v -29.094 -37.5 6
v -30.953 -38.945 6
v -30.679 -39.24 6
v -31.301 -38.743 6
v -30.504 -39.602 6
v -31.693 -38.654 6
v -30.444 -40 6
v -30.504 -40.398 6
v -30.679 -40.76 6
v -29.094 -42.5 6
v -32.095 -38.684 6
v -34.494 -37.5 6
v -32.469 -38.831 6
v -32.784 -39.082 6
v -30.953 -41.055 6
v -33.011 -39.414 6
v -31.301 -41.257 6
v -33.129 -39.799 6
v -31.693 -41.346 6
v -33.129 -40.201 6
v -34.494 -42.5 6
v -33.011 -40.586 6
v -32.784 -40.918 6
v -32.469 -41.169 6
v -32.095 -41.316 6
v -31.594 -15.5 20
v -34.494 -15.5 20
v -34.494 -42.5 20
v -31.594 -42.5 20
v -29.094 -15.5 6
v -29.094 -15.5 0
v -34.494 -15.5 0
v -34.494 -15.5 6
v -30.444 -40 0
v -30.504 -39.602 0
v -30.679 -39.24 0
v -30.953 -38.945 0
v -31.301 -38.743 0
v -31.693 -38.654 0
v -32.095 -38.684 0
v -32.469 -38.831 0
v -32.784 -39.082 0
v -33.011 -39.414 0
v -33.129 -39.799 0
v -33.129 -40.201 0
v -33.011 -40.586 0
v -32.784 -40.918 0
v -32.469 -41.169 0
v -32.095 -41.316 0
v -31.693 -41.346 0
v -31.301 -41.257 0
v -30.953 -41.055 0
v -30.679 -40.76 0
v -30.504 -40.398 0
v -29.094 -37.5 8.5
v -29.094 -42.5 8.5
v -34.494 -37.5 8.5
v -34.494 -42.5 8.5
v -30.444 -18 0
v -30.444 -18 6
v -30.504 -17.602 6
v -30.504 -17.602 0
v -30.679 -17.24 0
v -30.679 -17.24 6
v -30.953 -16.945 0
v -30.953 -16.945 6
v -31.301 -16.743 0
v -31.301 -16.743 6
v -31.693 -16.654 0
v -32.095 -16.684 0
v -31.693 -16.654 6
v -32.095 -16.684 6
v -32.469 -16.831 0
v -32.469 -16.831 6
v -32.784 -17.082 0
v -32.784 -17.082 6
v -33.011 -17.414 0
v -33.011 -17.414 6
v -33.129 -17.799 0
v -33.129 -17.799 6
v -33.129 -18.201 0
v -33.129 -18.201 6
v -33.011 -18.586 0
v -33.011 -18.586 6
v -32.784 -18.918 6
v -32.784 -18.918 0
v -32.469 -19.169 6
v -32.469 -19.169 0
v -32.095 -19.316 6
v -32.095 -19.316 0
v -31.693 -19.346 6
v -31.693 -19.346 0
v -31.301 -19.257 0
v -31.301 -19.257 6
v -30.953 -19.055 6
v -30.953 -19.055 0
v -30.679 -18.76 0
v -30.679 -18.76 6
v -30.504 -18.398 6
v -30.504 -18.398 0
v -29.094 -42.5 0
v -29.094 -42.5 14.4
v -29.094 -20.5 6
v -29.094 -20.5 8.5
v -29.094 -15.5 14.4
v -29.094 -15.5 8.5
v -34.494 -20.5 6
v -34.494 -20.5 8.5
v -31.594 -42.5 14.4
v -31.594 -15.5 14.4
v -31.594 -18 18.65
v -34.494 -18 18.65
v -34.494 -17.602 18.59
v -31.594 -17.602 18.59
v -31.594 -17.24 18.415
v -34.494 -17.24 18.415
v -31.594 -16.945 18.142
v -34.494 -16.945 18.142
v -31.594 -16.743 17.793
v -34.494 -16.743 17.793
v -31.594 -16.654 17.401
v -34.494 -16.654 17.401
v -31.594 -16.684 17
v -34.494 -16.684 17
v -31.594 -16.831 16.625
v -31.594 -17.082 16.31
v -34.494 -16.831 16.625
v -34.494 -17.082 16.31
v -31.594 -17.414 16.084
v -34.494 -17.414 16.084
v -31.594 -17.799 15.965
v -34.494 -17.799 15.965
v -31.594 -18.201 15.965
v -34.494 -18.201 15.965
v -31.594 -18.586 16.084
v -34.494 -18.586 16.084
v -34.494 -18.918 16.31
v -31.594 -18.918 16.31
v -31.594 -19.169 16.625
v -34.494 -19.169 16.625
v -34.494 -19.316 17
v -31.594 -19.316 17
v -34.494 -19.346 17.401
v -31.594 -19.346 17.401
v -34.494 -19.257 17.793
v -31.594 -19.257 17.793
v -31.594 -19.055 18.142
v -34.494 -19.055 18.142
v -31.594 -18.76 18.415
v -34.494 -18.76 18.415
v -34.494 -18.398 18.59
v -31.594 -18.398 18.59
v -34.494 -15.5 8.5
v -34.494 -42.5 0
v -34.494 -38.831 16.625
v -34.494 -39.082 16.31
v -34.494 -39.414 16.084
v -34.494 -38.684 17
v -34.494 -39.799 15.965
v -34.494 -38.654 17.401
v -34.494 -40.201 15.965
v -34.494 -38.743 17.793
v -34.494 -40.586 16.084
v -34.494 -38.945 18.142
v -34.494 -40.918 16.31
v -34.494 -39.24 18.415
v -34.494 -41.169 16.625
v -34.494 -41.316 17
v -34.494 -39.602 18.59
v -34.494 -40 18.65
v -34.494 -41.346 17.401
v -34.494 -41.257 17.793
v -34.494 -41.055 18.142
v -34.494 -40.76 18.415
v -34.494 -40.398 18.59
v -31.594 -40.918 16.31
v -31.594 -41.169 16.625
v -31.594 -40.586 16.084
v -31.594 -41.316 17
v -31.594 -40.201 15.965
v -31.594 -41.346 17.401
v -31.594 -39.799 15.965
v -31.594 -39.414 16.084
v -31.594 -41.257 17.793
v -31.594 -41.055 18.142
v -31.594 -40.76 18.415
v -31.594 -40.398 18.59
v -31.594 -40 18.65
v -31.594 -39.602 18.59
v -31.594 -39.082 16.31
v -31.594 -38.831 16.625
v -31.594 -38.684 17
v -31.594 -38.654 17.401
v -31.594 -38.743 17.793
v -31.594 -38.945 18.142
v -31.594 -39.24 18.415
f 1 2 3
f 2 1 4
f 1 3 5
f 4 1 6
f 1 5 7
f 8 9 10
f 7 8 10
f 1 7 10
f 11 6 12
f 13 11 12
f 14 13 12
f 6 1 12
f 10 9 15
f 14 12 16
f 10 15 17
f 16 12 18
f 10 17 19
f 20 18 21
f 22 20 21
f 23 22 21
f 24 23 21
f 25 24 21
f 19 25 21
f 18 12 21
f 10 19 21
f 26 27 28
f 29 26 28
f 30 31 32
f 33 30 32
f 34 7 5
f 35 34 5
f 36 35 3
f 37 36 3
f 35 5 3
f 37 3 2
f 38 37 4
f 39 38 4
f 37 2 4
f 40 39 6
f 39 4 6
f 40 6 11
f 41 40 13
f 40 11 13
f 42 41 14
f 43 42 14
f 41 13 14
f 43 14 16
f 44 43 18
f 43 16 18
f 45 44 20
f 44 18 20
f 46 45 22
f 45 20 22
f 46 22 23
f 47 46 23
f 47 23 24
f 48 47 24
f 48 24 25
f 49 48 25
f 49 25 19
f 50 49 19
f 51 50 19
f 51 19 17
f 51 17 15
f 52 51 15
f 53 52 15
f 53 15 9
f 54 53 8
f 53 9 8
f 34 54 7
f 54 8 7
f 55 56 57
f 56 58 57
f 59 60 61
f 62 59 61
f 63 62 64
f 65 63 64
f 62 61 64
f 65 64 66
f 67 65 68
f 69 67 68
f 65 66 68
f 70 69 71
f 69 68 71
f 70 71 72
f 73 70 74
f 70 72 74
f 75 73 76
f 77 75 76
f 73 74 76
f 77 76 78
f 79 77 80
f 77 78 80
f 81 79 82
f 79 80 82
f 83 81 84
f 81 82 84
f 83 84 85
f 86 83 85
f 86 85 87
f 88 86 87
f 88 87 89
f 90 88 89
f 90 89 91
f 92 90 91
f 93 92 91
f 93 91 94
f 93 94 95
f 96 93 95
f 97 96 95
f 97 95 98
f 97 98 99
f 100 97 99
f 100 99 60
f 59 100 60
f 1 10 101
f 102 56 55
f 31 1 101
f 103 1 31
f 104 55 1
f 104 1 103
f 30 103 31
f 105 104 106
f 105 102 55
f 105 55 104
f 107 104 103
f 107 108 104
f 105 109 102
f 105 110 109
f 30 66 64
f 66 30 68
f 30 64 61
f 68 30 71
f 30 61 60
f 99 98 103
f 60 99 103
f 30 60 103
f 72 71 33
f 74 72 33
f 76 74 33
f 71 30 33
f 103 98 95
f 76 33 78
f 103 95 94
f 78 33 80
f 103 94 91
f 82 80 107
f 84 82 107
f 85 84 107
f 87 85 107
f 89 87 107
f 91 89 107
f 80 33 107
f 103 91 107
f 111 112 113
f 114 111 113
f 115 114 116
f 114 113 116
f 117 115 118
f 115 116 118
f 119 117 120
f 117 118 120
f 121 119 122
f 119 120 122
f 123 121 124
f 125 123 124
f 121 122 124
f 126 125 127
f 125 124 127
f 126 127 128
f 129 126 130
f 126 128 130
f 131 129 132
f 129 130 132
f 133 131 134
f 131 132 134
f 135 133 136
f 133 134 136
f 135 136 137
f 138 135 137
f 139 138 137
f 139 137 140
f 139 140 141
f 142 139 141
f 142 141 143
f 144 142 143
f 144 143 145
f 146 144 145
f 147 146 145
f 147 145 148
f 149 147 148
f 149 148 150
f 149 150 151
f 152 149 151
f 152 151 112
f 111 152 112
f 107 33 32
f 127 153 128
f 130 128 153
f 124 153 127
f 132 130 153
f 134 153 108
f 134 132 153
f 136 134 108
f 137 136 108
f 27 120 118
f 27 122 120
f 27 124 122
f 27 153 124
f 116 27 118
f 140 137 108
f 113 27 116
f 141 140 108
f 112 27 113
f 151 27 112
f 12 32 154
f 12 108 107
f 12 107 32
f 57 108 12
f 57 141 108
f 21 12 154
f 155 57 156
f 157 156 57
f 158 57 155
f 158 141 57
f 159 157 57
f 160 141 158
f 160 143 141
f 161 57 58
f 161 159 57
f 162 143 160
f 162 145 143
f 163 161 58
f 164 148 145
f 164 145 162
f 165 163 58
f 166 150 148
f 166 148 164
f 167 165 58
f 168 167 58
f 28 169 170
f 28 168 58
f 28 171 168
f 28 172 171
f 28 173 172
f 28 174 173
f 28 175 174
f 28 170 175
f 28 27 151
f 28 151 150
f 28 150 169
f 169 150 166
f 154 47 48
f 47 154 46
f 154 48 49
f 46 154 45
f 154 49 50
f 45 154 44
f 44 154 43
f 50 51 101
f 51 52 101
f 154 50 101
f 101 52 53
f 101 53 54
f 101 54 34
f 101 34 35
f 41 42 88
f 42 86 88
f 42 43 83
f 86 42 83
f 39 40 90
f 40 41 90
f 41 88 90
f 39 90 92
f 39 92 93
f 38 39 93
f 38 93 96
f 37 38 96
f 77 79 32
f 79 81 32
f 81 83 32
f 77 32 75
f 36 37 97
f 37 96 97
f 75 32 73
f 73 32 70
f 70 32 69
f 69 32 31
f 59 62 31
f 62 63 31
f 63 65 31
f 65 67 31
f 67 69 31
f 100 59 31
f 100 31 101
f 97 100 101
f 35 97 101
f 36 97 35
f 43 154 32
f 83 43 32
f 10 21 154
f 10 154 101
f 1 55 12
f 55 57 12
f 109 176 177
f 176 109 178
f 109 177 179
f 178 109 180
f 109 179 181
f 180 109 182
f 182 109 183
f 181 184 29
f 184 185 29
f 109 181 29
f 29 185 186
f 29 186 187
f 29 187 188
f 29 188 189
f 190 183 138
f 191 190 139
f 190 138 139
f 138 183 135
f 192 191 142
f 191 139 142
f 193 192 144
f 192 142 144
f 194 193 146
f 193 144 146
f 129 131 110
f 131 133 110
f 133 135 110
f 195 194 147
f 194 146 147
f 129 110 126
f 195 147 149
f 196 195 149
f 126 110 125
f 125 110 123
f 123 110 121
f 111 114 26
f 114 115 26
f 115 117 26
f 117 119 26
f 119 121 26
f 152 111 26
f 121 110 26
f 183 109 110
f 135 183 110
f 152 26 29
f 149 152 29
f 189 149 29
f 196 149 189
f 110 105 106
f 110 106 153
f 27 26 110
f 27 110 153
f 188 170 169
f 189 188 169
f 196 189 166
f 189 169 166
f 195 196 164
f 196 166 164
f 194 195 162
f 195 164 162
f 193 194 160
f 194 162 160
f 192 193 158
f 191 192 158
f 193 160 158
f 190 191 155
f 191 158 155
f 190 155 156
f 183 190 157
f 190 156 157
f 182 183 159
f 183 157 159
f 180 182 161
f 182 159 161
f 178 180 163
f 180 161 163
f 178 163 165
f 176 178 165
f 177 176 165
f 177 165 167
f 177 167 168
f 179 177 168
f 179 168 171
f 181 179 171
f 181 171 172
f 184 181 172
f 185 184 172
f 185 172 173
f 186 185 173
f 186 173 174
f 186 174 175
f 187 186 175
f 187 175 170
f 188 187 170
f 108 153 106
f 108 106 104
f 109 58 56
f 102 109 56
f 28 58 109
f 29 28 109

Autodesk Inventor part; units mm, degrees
ref_plane "YZ Plane" through (0, 0, 0) normal (1, 0, 0) x (0, 1, 0)
ref_plane "XZ Plane" through (0, 0, 0) normal (0, 1, 0) x (-1, 0, 0)
ref_plane "작업 평면1" through (-17.0116, -44.6019, 14.5) normal (0, 0, -1) x (0, 1, 0)
sketch "스케치4" plane through (0, 0, 0) normal (0, 0, 1) x (1, 0, 0)
  arc A0 (-34.0751, 6.2636) -> (-34.5943, 4.5766) centre (-31.5943, 4.5766) ccw projected
  line L0 (-34.5943, -39.6766) -> (-34.5943, 4.5766) projected
  arc A1 (-34.5943, -39.6766) -> (-34.0751, -41.3636) centre (-31.5943, -39.6766) ccw projected
  line L1 (-30.3872, -46.7869) -> (-34.0751, -41.3636) projected
  arc A2 (-30.3872, -46.7869) -> (-27.9064, -48.1) centre (-27.9064, -45.1) ccw projected
  line L2 (-1.0822, -48.1) -> (-27.9064, -48.1) projected
  arc A3 (-1.0822, -48.1) -> (1.3986, -46.7869) centre (-1.0822, -45.1) ccw projected
  line L3 (5.0865, -41.3636) -> (1.3986, -46.7869) projected
  arc A4 (5.0865, -41.3636) -> (5.6057, -39.6766) centre (2.6057, -39.6766) ccw projected
  line L4 (5.6057, 4.5766) -> (5.6057, -39.6766) projected
  arc A5 (5.6057, 4.5766) -> (5.0865, 6.2636) centre (2.6057, 4.5766) ccw projected
  line L5 (1.1009, 12.1246) -> (5.0865, 6.2636) projected
  arc A6 (1.1009, 12.1246) -> (-0.5529, 13) centre (-0.5529, 11) ccw projected
  line L6 (-6.8443, 13) -> (-0.5529, 13) projected
  arc A7 (-5.3443, 11.5) -> (-6.8443, 13) centre (-6.8443, 11.5) ccw projected
  line L7 (-5.3443, 11.5) -> (-5.3443, 10) projected
  arc A8 (-5.3443, 10) -> (-2.9943, 7.65) centre (-2.9943, 10) ccw projected
  line L8 (-2.9943, 7.65) -> (-0.9943, 7.65) projected
  arc A9 (0.0057, 6.65) -> (-0.9943, 7.65) centre (-0.9943, 6.65) ccw projected
  line L9 (0.0057, 6.65) -> (0.0057, -36.15) projected
  arc A10 (-0.9943, -37.15) -> (0.0057, -36.15) centre (-0.9943, -36.15) ccw projected
  line L10 (-0.9943, -37.15) -> (-2.9943, -37.15) projected
  arc A11 (-2.9943, -37.15) -> (-5.3443, -39.5) centre (-2.9943, -39.5) ccw projected
  line L11 (-5.3443, -39.5) -> (-5.3443, -41.5) projected
  arc A12 (-6.3443, -42.5) -> (-5.3443, -41.5) centre (-6.3443, -41.5) ccw projected
  line L12 (-6.3443, -42.5) -> (-22.6443, -42.5) projected
  arc A13 (-23.6443, -41.5) -> (-22.6443, -42.5) centre (-22.6443, -41.5) ccw projected
  line L13 (-23.6443, -41.5) -> (-23.6443, -39.5) projected
  arc A14 (-23.6443, -39.5) -> (-25.9943, -37.15) centre (-25.9943, -39.5) ccw projected
  line L14 (-25.9943, -37.15) -> (-27.9943, -37.15) projected
  arc A15 (-28.9943, -36.15) -> (-27.9943, -37.15) centre (-27.9943, -36.15) ccw projected
  line L15 (-28.9943, -36.15) -> (-28.9943, 6.65) projected
  arc A16 (-27.9943, 7.65) -> (-28.9943, 6.65) centre (-27.9943, 6.65) ccw projected
  line L16 (-27.9943, 7.65) -> (-25.9943, 7.65) projected
  arc A17 (-25.9943, 7.65) -> (-23.6443, 10) centre (-25.9943, 10) ccw projected
  line L17 (-23.6443, 10) -> (-23.6443, 11.5) projected
  arc A18 (-22.1443, 13) -> (-23.6443, 11.5) centre (-22.1443, 11.5) ccw projected
  line L18 (-28.4357, 13) -> (-22.1443, 13) projected
  arc A19 (-28.4357, 13) -> (-30.0896, 12.1246) centre (-28.4357, 11) ccw projected
  line L19 (-34.0751, 6.2636) -> (-30.0896, 12.1246) projected
  circle A20 centre (2.8057, 4) radius 1.35 projected
  circle A21 centre (2.8057, -18) radius 1.35 projected
  circle A22 centre (-3.4943, -45.3) radius 1.35 projected
  circle A23 centre (-31.7943, 4) radius 1.35 projected
  circle A24 centre (-31.7943, -18) radius 1.35 projected
  circle A25 centre (-25.4943, -45.3) radius 1.35 projected
  circle A26 centre (2.8057, -40) radius 1.35 projected
  circle A27 centre (-31.7943, -40) radius 1.35 projected
  line L20 (-31.7943, -40) -> (-31.7943, -18)
  line L21 (-29.0943, -15.5) -> (-34.4943, -15.5)
  line L22 (-34.4943, -15.5) -> (-34.4943, -42.5)
  line L23 (-34.4943, -42.5) -> (-29.0943, -42.5)
  line L24 (-29.0943, -42.5) -> (-29.0943, -15.5)
  line L25 (-29.0943, -15.5) -> (-34.4943, -42.5) construction
  line L26 (-34.4943, -15.5) -> (-29.0943, -42.5) construction
  point P0 (0, 0)
  point P1 (-31.7943, -29)
  dimension "d10" = 5.4
  dimension "d11" = 27
extrude "돌출4" add sketch "스케치4" against normal blind 6 contours L22 L21 L24 L23 L1 A1 | A1 L1 L23 L22
sketch "스케치5" plane through (0, 0, 0) normal (0, 0, 1) x (1, 0, 0)
  line L0 (-34.4943, -15.5) -> (-34.4943, -42.5) projected
  line L1 (-34.4943, -42.5) -> (-29.0943, -42.5) projected
  line L2 (-29.0943, -42.5) -> (-29.0943, -15.5) projected
  line L3 (-29.0943, -15.5) -> (-34.4943, -15.5) projected
  circle A0 centre (-31.7943, -40) radius 1.35 projected
  circle A1 centre (-31.7943, -18) radius 1.35 projected
  point P0 (0, 0)
extrude "돌출5" add sketch "스케치5" along normal blind 14.4 contours L3 L2 L1 L0 | A0 | A1
sketch "스케치6" plane through (-34.4943, -42.5, -6) normal (-1, 0, 0) x (0, 0, 1)
  line L0 (25.6, 57) -> (29.1, 57)
  line L1 (25.6, 57) -> (20.5, 51)
  line L2 (20.5, 51) -> (20.5, -2.1)
  line L3 (20.5, -2.1) -> (25.6, -8.1)
  line L4 (25.6, -8.1) -> (55.6, -8.1)
  line L5 (55.6, -8.1) -> (60.7, -2.1)
  line L6 (60.7, -2.1) -> (60.7, 51)
  line L7 (60.7, 51) -> (55.6, 57)
  line L8 (52.1, 57) -> (55.6, 57)
  arc A0 (55.1, 54) -> (52.1, 57) centre (52.1, 54) ccw
  line L9 (55.1, 0.5) -> (55.1, 54)
  arc A1 (52.1, -2.5) -> (55.1, 0.5) centre (52.1, 0.5) ccw
  line L10 (29.1, -2.5) -> (52.1, -2.5)
  arc A2 (26.1, 0.5) -> (29.1, -2.5) centre (29.1, 0.5) ccw
  line L11 (26.1, 54) -> (26.1, 0.5)
  arc A3 (29.1, 57) -> (26.1, 54) centre (29.1, 54) ccw
  circle A4 centre (57.9, 46.5) radius 1.35
  circle A5 centre (57.9, 24.5) radius 1.35
  circle A6 centre (57.9, 2.5) radius 1.35
  circle A7 centre (51.6, -5.3) radius 1.35
  circle A8 centre (23.3, 46.5) radius 1.35
  circle A9 centre (23.3, 24.5) radius 1.35
  circle A10 centre (23.3, 2.5) radius 1.35
  circle A11 centre (29.6, -5.3) radius 1.35
  line L12 (20.4, 27) -> (0, 27)
  line L13 (0, 0) -> (0, 27)
  line L14 (0, 0) -> (20.4, 0)
  line L15 (20.4, 27) -> (20.4, 0)
  line L16 (20.4, 0) -> (20.4, 27)
  line L17 (20.4, 27) -> (26, 27)
  line L18 (26, 27) -> (26, 0)
  line L19 (26, 0) -> (20.4, 0)
  line L20 (25.6959, -1.4327) -> (25.7781, -6.0132)
  line L21 (68.9946, 18.9724) -> (67.812, 18.9512)
  arc A12 (65.7765, 20.915) -> (67.812, 18.9512) centre (67.7762, 20.9508) ccw
  line L22 (65.7765, 20.915) -> (65.7397, 22.9646)
  arc A13 (65.7397, 22.9646) -> (64.7219, 23.9465) centre (64.7399, 22.9467) ccw
  line L23 (64.7219, 23.9465) -> (31.7272, 23.3545)
  arc A14 (31.7272, 23.3545) -> (30.7453, 22.3368) centre (31.7452, 22.3547) ccw
  line L24 (30.7453, 22.3368) -> (30.7821, 20.2871)
  arc A15 (28.8183, 18.2515) -> (30.7821, 20.2871) centre (28.7824, 20.2512) ccw
  line L25 (28.8183, 18.2515) -> (26.8186, 18.2157)
  arc A16 (26.8186, 18.2157) -> (25.8367, 17.1979) centre (26.8366, 17.2158) ccw
  line L26 (25.8367, 17.1979) -> (26.0574, 4.8999)
  arc A17 (26.0574, 4.8999) -> (27.0752, 3.918) centre (27.0572, 4.9178) ccw
  line L27 (27.0752, 3.918) -> (29.0748, 3.9538)
  arc A18 (31.1104, 1.99) -> (29.0748, 3.9538) centre (29.1107, 1.9542) ccw
  line L28 (31.1104, 1.99) -> (31.1472, -0.0596)
  arc A19 (31.1472, -0.0596) -> (32.165, -1.0415) centre (32.147, -0.0417) ccw
  line L29 (32.165, -1.0415) -> (65.1596, -0.4495)
  arc A20 (65.1596, -0.4495) -> (66.1415, 0.5682) centre (65.1417, 0.5503) ccw
  line L30 (66.1415, 0.5682) -> (66.1048, 2.6179)
  arc A21 (68.0686, 4.6535) -> (66.1048, 2.6179) centre (68.1044, 2.6538) ccw
  line L31 (68.0686, 4.6535) -> (69.2511, 4.6747)
  spline S0 degree 3 poles (69.2511, 4.6747) (69.5339, 4.6798) (69.869, 4.7337) (70.3387, 4.9133) (70.5662, 5.0474) (70.8526, 5.3129) (70.9739, 5.4731) (71.0515, 5.6305) knots 0 0 0 0 0.420045 0.420045 0.746892 0.746892 1 1 1 1
  line L32 (71.1676, -0.8418) -> (71.0515, 5.6305)
  line L33 (65.2601, -6.0486) -> (71.1676, -0.8418)
  line L34 (26.6663, -6.7411) -> (65.2601, -6.0486)
  line L35 (20.5758, -1.7496) -> (26.6663, -6.7411)
  line L36 (20.1201, 23.6464) -> (20.5758, -1.7496)
  line L37 (26.0277, 28.8532) -> (20.1201, 23.6464)
  line L38 (64.6215, 29.5456) -> (26.0277, 28.8532)
  line L39 (70.712, 24.5541) -> (64.6215, 29.5456)
  line L40 (70.8281, 18.0818) -> (70.712, 24.5541)
  spline S1 degree 3 poles (70.8281, 18.0818) (70.7449, 18.2363) (70.6179, 18.3921) (70.3222, 18.6471) (70.09, 18.7729) (69.6142, 18.9356) (69.2774, 18.9775) (68.9946, 18.9724) knots 0 0 0 0 0.253108 0.253108 0.579955 0.579955 1 1 1 1
  circle A22 centre (63.1719, 26.7192) radius 1.35
  circle A23 centre (46.1747, 26.4142) radius 1.35
  circle A24 centre (22.995, 19.4973) radius 1.35
  circle A25 centre (63.7101, -3.276) radius 1.35
  circle A26 centre (46.7129, -3.581) radius 1.35
  circle A27 centre (23.3, 2.5) radius 1.35
  circle A28 centre (29.1774, 26.1092) radius 1.35
  circle A29 centre (29.7156, -3.8859) radius 1.35
  line L41 (26, 23.5159) -> (0, 23.5159)
  point P0 (6, 42.5)
  dimension "d16" = 5.6
extrude "돌출6" add sketch "스케치6" against normal blind 2.9 contours L17 L37 L2 | L2 L37 L15 L17 | L37 L17 L18 L41 A9 L2 | L2 L41 L15 L37 | L41 A9 L18 A16 L26 L19 L36 L2 | L2 L36 L15 L41 | L18 L26 A16 | L36 L19 L2 | L2 L19 L15 L36 | A24
sketch "스케치7" plane through (-34.4943, -42.5, -6) normal (-1, 0, 0) x (0, 0, 1)
  line L0 (0, 1.15) -> (0, 3.85) projected
  line L1 (6, 3.85) -> (6, 1.15) projected
  line L2 (0, 23.15) -> (0, 25.85) projected
  line L3 (0, 23.15) -> (0, 25.85) projected
  line L4 (6, 2.5) -> (0, 2.5)
  line L5 (0, 2.5) -> (0, 24.5)
  line L6 (0, 24.5) -> (6, 24.5)
  line L7 (6, 24.5) -> (6, 2.5)
  line L8 (6, 2.5) -> (6, 24.5)
  line L9 (6, 24.5) -> (7.25, 24.5)
  line L10 (7.25, 24.5) -> (7.25, 2.5)
  line L11 (7.25, 2.5) -> (6, 2.5)
  line L12 (8.5, 5) -> (6, 5)
  line L13 (6, 5) -> (6, 0)
  line L14 (6, 0) -> (8.5, 0)
  line L15 (8.5, 0) -> (8.5, 5)
  line L16 (8.5, 5) -> (6, 0) construction
  line L17 (6, 5) -> (8.5, 0) construction
  line L18 (8.5, 22) -> (6, 22)
  line L19 (6, 22) -> (6, 27)
  line L20 (6, 27) -> (8.5, 27)
  line L21 (8.5, 27) -> (8.5, 22)
  line L22 (8.5, 22) -> (6, 27) construction
  line L23 (6, 22) -> (8.5, 27) construction
  point P0 (6, 42.5)
  point P1 (6, 5)
  point P2 (6, 1.15)
  dimension "d19" = 1.25
  dimension "d20" = 2.5
  dimension "d21" = 5
  dimension "d22" = 2.5
  dimension "d23" = 5
extrude "돌출7" cut sketch "스케치7" against normal through all contours L11 L10 L12 L15 L14 L13 L1 | L1 L7 L12 L10 L11 | L9 L10 L18 L7 | L19 L20 L21 L18 L10 L9
move faces "이동1" translate (0, 0, 6) faces at (-29.5959, -25.5425, -6) (-32.6943, -37.5, 1.6667) (-32.6943, -20.5, 0.8333) (-30.8943, -17.1667, 2.5) (-29.5443, -18, 0) (-30.4487, -18.1086, -4) (-30.8943, -15.5, -2) (-30.8943, -39.1667, 2.5) (-29.5443, -40, 0) (-30.4487, -40.1086, -4) (-32.6943, -42.5, -4)
properties part number "Vertical_Connector_CPY"
